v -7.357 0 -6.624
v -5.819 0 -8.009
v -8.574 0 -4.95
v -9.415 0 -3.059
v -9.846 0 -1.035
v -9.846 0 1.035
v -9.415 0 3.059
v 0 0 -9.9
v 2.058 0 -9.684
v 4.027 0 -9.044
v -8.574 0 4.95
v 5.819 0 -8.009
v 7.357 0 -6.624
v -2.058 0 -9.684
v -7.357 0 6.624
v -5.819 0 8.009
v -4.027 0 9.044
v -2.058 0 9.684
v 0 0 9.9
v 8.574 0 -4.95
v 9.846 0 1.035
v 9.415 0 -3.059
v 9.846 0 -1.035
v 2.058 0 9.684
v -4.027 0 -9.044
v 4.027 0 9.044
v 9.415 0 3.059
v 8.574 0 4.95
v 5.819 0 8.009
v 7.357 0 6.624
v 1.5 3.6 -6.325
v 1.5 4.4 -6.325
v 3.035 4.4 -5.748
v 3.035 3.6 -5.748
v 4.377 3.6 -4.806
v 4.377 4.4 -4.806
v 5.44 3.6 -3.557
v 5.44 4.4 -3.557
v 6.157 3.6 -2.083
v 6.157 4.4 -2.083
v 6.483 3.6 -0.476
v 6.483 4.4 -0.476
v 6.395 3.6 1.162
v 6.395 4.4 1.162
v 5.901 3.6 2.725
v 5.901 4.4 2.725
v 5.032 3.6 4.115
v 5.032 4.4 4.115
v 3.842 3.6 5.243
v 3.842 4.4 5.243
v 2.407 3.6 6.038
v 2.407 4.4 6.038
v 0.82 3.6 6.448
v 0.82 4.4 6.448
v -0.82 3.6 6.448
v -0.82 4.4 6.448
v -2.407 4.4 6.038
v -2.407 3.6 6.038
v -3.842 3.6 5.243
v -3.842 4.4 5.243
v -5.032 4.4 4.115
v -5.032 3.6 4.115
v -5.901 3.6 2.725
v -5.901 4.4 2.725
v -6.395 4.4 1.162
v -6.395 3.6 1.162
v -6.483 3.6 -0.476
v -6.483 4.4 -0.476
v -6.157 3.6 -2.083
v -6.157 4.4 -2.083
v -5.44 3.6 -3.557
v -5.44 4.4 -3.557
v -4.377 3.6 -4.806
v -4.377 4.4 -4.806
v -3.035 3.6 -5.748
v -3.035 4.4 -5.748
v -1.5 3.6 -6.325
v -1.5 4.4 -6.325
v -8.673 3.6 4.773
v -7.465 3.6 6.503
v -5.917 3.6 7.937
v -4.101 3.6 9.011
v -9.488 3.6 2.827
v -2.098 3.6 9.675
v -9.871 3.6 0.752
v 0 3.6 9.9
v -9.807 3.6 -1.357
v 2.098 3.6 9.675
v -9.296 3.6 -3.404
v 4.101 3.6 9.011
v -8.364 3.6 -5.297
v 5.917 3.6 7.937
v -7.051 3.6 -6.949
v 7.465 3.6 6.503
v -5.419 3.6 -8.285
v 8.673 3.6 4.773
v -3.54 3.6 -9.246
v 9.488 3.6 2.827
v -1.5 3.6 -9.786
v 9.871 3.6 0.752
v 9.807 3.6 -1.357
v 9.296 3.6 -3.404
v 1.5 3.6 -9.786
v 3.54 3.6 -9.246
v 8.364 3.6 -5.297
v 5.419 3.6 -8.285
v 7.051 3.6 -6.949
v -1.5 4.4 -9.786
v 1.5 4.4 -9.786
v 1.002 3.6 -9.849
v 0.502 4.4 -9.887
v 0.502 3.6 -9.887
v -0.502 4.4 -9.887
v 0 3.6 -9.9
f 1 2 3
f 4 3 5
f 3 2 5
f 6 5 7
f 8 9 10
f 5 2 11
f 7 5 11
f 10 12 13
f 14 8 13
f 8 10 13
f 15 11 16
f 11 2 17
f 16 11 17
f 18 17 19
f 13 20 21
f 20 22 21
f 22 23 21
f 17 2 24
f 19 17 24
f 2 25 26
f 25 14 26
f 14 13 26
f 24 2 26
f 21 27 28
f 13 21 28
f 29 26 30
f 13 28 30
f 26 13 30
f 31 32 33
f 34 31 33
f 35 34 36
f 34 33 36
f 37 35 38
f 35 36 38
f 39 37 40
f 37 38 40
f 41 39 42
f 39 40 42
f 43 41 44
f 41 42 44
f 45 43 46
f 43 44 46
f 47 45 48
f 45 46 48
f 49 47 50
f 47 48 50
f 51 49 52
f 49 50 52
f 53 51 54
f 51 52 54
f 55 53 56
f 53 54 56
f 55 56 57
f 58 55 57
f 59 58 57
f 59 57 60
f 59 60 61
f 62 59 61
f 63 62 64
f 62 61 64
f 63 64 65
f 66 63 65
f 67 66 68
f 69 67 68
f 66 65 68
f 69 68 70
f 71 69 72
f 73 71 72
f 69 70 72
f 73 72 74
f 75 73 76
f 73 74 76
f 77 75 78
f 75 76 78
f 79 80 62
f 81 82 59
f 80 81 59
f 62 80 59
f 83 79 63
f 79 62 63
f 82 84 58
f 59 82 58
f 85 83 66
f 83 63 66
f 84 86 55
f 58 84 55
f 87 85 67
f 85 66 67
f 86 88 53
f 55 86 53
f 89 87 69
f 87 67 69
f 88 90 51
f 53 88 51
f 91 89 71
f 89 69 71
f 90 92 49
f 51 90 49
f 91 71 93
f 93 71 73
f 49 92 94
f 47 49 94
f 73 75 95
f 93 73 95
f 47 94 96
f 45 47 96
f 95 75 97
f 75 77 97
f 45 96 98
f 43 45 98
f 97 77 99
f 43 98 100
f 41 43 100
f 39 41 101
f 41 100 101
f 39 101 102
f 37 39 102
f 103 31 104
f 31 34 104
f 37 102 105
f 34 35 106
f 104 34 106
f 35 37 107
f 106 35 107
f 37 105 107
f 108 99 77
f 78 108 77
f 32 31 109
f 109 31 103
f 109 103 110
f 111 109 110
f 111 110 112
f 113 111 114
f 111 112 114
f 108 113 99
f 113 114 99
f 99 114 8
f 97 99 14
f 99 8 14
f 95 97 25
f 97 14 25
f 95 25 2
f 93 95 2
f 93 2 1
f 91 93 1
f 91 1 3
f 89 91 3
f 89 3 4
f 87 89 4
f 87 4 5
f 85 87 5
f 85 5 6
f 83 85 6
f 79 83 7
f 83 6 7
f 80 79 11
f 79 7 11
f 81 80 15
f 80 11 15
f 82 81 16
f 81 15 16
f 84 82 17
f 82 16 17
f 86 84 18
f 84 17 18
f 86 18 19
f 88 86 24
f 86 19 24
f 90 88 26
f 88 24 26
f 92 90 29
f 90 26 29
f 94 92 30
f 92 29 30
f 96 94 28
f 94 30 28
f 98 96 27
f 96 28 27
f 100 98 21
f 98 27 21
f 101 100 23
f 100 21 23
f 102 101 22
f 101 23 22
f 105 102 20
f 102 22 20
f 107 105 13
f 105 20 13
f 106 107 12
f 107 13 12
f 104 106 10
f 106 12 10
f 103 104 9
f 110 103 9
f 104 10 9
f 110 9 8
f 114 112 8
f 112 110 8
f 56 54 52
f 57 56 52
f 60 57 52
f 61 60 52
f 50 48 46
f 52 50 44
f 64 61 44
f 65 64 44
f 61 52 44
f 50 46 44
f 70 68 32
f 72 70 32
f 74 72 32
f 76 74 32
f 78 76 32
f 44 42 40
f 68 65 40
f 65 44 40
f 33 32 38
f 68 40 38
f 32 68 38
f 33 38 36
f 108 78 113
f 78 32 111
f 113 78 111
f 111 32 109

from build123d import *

# Parameters (mm, degrees)
BOSS_EXTRUDE1_DEPTH = 0.8


with BuildPart() as part:
    # Sketch1 → Revolve1 (revolve)
    with BuildSketch(Plane(origin=(0, 0, 0), x_dir=(0, 0, -1), z_dir=(1, 0, 0))):
        Polygon((0, 0), (9.9, 0), (9.9, 3.6), (6.5, 3.6), (6.5, 4.4), (0, 4.4), align=None)
    revolve(axis=Axis((0, 4.4, 0), (0, -1, 0)))

    # Sketch2 → Boss-Extrude1 (add)
    with BuildSketch(Plane(origin=(0, 3.6, 0), x_dir=(1, 0, 0), z_dir=(0, 1, 0))):
        with BuildLine():
            Line((-1.5, 6.32455532), (1.5, 6.32455532))
            Line((1.5, 6.32455532), (1.5, 9.785703858))
            ThreePointArc((1.5, 9.785703858), (0, 9.9), (-1.5, 9.785703858))
            Line((-1.5, 9.785703858), (-1.5, 6.32455532))
        make_face()
    extrude(amount=BOSS_EXTRUDE1_DEPTH)


solid = part.part
